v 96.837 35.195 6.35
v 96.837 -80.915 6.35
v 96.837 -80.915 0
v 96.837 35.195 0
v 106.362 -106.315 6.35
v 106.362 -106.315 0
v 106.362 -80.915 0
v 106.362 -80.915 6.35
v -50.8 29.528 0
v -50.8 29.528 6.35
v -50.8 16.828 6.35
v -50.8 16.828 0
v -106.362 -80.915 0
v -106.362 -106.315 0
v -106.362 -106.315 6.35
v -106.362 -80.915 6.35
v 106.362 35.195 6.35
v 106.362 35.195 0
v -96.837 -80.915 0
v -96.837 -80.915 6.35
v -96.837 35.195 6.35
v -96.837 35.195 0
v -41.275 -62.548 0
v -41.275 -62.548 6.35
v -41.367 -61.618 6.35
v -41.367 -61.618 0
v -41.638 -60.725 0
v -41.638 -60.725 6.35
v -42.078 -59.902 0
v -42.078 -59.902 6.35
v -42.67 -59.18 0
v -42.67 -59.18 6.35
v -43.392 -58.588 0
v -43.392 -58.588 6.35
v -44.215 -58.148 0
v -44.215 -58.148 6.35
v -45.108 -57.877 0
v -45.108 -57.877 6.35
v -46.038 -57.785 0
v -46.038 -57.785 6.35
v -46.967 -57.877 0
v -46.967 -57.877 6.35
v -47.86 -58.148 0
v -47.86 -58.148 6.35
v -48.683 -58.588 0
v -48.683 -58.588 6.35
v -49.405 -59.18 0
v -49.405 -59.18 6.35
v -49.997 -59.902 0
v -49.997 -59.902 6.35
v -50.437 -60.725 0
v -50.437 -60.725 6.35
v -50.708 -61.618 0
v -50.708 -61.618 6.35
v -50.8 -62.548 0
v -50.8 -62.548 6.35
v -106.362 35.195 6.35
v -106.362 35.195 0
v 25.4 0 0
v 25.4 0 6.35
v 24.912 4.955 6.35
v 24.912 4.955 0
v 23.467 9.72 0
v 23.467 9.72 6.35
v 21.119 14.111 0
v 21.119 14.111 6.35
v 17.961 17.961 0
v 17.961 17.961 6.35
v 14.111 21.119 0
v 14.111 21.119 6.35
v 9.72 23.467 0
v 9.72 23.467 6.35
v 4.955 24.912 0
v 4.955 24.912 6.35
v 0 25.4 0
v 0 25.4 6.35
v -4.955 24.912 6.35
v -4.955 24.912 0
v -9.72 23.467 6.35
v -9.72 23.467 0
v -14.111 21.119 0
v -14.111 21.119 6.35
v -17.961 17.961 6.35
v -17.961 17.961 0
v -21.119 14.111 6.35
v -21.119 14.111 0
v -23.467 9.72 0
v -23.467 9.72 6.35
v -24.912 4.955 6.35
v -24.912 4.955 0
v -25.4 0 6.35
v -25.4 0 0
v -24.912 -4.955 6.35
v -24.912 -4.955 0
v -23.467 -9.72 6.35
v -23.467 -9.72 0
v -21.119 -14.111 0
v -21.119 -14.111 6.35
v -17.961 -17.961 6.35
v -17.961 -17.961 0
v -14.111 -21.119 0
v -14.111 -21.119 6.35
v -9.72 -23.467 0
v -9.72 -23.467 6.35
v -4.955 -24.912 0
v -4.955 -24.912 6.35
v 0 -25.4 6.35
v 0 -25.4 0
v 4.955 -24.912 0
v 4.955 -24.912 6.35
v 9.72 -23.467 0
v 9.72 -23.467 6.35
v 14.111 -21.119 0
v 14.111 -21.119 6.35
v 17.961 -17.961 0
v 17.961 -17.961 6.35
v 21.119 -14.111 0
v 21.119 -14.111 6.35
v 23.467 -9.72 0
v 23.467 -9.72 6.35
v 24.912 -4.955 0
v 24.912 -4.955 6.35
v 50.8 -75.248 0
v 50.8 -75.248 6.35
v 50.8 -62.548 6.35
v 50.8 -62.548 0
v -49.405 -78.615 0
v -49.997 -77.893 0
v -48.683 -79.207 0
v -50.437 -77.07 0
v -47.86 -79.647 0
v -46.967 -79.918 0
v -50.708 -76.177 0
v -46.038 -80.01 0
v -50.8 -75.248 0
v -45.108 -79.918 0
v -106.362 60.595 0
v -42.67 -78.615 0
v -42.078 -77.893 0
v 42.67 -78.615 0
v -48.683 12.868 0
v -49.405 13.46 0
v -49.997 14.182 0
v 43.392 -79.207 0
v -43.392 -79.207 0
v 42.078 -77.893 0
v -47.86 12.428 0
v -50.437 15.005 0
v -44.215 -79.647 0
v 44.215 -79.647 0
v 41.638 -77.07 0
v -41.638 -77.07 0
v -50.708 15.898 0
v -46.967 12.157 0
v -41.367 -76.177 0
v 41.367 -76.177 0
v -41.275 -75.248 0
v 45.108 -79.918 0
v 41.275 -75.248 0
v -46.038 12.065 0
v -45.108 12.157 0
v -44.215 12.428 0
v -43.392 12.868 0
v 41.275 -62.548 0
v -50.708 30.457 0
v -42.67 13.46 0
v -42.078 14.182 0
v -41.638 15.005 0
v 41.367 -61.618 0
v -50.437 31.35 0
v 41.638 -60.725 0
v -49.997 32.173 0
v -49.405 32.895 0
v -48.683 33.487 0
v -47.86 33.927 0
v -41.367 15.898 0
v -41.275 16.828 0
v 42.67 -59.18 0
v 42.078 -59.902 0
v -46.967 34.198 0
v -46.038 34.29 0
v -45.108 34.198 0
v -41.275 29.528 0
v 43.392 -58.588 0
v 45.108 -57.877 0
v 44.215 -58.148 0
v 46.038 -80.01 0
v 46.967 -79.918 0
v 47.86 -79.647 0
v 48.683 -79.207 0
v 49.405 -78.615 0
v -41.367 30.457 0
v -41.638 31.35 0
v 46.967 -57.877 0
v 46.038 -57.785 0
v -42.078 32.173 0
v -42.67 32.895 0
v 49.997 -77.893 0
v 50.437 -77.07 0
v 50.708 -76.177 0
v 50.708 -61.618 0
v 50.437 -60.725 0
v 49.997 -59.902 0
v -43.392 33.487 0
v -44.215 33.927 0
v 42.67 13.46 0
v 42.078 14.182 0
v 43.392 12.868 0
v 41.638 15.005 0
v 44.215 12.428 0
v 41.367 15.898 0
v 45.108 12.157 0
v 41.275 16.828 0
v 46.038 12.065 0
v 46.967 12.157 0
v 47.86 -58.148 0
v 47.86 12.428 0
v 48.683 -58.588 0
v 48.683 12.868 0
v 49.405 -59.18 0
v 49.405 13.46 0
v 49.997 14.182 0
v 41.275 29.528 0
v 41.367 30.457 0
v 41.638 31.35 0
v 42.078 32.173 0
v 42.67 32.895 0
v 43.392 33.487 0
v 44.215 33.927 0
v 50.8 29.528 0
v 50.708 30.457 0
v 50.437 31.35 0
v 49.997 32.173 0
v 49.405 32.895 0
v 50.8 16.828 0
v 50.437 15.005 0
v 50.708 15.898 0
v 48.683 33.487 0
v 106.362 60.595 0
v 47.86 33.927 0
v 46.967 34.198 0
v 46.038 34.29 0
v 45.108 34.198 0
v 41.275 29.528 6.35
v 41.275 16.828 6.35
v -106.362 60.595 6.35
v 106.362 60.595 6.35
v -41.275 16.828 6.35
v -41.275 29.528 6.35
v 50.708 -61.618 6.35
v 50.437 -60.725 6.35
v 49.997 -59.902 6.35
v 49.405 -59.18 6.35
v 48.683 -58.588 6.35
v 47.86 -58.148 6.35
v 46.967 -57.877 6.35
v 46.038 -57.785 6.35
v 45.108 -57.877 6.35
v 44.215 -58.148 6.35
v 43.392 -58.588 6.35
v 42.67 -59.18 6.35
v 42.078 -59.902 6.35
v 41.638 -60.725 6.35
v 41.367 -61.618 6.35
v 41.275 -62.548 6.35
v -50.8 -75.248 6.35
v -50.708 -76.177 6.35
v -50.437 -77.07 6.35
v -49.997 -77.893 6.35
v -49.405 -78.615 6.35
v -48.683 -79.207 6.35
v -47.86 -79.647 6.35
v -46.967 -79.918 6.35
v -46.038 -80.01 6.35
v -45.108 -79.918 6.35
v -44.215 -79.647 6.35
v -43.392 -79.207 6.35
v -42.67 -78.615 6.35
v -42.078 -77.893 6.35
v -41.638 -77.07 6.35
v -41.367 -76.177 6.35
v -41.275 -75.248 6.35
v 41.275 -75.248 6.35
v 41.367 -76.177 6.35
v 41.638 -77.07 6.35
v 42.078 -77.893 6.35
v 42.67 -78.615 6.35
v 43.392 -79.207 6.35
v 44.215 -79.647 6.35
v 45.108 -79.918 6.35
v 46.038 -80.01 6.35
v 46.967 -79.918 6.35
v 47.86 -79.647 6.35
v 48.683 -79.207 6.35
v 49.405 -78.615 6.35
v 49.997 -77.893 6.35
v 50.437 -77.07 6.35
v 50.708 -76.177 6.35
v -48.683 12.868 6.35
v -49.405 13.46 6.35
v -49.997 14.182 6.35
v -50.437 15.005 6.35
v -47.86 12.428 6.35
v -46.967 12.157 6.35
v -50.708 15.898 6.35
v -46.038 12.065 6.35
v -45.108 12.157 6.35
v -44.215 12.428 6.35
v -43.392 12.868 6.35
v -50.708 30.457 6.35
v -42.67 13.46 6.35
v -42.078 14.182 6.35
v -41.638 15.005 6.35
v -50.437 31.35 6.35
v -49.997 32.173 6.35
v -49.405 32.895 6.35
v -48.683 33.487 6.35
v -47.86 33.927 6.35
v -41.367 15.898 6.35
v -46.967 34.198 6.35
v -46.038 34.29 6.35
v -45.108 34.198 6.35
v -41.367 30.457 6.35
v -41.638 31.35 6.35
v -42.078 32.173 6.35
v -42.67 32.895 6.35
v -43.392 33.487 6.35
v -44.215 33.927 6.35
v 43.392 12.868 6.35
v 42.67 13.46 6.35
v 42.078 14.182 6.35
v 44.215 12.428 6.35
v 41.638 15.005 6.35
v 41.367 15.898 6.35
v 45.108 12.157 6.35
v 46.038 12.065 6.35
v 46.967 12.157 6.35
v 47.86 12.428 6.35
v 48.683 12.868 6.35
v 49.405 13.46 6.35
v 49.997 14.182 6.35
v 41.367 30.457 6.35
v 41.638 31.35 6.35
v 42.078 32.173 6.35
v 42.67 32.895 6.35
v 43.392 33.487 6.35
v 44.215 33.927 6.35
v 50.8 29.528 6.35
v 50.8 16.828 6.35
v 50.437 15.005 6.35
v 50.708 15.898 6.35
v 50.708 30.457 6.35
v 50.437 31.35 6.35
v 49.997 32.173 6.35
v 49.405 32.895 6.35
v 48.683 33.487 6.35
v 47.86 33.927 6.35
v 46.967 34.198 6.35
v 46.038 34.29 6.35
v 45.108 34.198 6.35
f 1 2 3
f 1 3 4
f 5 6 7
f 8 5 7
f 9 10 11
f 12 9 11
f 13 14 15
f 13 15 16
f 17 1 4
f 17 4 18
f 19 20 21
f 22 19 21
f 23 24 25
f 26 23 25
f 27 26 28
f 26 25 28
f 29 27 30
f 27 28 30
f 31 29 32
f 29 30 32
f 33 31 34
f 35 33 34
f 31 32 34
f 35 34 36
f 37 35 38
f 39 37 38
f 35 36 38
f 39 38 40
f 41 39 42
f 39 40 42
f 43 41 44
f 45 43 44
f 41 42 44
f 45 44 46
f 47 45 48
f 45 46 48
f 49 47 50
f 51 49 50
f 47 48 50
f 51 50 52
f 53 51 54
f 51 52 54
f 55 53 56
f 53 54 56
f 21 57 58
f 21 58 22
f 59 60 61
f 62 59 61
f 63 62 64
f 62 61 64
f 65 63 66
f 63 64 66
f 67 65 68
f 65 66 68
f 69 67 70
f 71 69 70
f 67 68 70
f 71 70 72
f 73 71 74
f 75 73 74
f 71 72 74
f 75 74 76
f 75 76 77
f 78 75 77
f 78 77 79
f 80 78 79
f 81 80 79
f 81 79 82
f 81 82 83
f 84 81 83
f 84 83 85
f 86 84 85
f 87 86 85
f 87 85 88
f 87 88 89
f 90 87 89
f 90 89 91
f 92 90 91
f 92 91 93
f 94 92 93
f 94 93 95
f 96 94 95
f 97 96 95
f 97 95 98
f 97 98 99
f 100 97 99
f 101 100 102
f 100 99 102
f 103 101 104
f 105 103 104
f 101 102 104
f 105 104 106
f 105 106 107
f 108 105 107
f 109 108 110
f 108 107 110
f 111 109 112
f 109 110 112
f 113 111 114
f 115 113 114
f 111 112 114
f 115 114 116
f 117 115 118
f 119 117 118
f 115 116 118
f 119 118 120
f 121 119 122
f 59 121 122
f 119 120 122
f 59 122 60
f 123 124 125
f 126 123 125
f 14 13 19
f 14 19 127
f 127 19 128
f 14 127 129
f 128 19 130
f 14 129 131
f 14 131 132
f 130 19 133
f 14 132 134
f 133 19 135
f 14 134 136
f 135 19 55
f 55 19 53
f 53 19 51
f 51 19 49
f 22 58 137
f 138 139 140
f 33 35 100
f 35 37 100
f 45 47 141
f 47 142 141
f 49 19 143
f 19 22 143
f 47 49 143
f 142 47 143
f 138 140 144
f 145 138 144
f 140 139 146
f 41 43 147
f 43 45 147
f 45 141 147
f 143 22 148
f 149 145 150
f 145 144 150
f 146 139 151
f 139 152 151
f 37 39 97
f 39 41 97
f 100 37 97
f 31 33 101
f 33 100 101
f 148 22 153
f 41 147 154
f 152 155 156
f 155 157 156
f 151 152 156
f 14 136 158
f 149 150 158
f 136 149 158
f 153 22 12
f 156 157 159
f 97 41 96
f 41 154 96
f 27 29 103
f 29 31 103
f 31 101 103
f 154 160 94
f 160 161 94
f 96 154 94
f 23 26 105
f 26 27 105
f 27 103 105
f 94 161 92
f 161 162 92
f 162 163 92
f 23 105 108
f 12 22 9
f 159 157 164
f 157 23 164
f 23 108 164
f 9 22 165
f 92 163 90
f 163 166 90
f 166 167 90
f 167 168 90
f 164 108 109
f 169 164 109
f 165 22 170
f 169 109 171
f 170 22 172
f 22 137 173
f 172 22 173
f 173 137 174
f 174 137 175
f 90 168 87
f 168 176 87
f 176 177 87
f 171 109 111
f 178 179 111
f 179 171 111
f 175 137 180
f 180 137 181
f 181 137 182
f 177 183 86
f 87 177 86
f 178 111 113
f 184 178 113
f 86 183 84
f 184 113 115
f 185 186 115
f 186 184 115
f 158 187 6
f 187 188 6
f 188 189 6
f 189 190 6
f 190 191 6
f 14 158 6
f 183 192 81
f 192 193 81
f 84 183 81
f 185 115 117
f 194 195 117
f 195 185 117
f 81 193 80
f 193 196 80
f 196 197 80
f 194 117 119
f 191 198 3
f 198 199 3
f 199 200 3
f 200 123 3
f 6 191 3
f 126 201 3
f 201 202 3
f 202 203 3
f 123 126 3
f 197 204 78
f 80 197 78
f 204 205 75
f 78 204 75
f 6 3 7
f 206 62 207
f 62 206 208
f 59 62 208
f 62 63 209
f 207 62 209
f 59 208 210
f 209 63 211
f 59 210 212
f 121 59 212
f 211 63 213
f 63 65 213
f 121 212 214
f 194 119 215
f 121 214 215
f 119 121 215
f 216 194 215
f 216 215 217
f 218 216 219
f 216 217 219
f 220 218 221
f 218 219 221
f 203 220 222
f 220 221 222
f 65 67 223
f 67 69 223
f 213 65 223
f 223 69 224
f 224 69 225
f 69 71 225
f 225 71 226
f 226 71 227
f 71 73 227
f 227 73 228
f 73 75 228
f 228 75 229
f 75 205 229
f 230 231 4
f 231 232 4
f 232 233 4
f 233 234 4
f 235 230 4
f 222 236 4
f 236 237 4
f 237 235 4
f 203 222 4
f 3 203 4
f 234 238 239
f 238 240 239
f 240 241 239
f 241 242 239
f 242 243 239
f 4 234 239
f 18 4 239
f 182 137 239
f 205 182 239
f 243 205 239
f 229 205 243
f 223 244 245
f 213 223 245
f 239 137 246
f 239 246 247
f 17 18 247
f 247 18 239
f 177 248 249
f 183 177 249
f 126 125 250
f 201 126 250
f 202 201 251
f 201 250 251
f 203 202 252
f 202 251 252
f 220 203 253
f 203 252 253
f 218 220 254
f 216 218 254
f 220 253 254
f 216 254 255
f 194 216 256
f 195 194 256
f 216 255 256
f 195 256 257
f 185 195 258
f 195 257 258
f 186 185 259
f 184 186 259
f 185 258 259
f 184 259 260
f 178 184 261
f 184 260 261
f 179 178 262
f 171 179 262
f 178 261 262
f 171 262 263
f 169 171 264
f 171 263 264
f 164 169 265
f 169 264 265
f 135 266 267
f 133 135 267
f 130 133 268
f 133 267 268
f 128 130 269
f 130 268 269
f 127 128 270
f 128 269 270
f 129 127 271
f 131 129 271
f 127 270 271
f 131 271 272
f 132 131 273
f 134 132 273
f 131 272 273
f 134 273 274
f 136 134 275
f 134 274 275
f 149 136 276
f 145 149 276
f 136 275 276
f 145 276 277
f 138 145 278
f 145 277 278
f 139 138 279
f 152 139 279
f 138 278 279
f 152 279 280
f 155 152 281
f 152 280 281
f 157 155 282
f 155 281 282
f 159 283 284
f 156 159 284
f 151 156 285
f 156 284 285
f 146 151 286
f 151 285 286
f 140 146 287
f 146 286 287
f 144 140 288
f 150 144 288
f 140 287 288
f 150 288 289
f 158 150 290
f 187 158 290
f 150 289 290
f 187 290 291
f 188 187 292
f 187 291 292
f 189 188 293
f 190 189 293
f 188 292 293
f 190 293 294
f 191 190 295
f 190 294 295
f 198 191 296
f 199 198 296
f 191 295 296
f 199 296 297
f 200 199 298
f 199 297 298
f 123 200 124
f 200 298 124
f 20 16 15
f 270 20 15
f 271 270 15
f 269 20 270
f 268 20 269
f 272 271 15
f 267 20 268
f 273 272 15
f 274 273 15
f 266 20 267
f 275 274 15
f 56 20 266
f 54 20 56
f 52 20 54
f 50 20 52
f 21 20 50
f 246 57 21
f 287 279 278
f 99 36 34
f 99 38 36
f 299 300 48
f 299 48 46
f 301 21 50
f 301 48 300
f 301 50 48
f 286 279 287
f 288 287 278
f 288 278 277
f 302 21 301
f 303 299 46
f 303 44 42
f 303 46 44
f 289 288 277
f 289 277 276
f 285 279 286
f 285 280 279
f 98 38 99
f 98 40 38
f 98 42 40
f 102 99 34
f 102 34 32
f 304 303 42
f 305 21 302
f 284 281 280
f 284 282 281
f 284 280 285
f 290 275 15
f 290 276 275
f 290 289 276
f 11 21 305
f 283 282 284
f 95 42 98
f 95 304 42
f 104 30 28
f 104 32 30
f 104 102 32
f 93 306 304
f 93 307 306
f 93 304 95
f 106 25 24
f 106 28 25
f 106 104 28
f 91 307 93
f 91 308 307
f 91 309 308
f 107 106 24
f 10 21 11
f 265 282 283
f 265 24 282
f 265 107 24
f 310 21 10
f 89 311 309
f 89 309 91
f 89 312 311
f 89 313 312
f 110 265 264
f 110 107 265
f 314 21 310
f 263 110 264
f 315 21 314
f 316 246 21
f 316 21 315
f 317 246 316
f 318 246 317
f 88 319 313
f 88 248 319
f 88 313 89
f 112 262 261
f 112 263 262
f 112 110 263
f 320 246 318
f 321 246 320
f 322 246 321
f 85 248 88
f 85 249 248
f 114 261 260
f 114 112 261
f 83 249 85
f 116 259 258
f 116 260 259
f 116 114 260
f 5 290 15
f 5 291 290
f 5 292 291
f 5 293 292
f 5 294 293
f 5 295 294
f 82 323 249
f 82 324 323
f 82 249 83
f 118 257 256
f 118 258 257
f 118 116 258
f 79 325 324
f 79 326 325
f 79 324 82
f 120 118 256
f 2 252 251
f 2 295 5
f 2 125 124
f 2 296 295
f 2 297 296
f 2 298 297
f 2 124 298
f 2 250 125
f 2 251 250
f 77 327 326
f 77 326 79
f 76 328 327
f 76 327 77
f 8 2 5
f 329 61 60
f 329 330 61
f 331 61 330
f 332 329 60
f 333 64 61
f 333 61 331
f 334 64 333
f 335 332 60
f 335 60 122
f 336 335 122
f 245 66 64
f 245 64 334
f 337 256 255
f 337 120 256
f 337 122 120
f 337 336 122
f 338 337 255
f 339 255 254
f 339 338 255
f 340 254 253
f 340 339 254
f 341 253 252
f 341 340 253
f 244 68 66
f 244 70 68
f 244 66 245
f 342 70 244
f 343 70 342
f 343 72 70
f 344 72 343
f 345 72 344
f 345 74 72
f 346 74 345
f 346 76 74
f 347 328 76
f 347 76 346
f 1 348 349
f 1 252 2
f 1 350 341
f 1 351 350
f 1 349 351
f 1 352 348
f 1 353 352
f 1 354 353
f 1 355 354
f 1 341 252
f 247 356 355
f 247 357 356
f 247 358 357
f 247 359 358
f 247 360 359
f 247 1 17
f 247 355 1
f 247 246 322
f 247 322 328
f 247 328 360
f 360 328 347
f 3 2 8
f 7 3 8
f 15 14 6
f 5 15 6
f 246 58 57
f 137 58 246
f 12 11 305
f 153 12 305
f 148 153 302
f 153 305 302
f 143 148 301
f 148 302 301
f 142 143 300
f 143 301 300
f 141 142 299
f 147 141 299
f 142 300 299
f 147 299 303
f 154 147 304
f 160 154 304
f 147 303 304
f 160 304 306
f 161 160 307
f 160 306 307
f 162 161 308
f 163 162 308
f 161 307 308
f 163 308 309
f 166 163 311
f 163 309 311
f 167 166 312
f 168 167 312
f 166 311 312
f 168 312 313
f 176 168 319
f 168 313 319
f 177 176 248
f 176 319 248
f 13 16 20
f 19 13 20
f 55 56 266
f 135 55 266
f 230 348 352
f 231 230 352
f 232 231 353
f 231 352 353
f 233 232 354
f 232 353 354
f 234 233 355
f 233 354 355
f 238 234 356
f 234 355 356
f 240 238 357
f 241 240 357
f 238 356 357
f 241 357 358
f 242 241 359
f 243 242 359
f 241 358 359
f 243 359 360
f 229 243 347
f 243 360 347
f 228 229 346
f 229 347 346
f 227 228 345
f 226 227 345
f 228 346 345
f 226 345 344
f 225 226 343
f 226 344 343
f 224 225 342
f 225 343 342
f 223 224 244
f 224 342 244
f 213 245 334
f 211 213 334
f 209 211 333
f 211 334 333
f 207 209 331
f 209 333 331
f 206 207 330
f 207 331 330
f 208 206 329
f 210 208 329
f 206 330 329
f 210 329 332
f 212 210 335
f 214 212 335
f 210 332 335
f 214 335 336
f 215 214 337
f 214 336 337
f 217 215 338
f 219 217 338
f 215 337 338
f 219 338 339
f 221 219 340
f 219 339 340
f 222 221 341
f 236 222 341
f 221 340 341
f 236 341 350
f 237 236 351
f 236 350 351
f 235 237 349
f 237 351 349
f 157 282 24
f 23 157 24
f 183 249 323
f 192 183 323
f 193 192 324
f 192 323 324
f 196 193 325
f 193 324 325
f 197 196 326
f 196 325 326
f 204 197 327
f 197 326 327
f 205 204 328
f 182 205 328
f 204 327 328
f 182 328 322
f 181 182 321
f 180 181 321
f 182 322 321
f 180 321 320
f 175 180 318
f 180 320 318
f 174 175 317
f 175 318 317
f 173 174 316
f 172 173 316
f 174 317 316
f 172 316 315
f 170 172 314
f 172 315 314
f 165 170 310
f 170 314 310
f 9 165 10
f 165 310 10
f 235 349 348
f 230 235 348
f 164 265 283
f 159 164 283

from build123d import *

# Parameters (mm, degrees)
SKETCH2_W          = 212.725
SKETCH2_H          = 166.909166922
EXTRUDE1_DEPTH     = 6.35
CUT_EXTRUDE1_REACH = 152.519
SKETCH3_R          = 25.4
CUT_EXTRUDE2_REACH = 152.519
SKETCH4_W          = 9.525
SKETCH4_H          = 116.109166922


with BuildPart() as part:
    # Sketch2 → Extrude1 (new body)
    with BuildSketch(Plane.XY):
        with Locations((0, -22.86)):
            Rectangle(SKETCH2_W, SKETCH2_H)
    extrude(amount=EXTRUDE1_DEPTH)

    # Sketch3 → Cut-Extrude1 (cut, up to next)
    with BuildSketch(Plane.XY.offset(6.35), mode=Mode.PRIVATE) as cut_extrude1_sk1:
        Circle(SKETCH3_R)
    cut_extrude1_tool1 = extrude(cut_extrude1_sk1.sketch, amount=-CUT_EXTRUDE1_REACH, mode=Mode.PRIVATE) & part.part
    # Sketch3 → Cut-Extrude1 (cut, up to next)
    with BuildSketch(Plane.XY.offset(6.35), mode=Mode.PRIVATE) as cut_extrude1_sk2:
        with BuildLine():
            Line((50.8, -75.2475), (50.8, -62.5475))
            ThreePointArc((50.8, -62.5475), (46.0375, -57.785), (41.275, -62.5475))
            Line((41.275, -62.5475), (41.275, -75.2475))
            ThreePointArc((41.275, -75.2475), (46.0375, -80.01), (50.8, -75.2475))
        make_face()
    cut_extrude1_tool2 = extrude(cut_extrude1_sk2.sketch, amount=-CUT_EXTRUDE1_REACH, mode=Mode.PRIVATE) & part.part
    # Sketch3 → Cut-Extrude1 (cut, up to next)
    with BuildSketch(Plane.XY.offset(6.35), mode=Mode.PRIVATE) as cut_extrude1_sk3:
        with BuildLine():
            Line((50.8, 16.8275), (50.8, 29.5275))
            ThreePointArc((50.8, 29.5275), (46.0375, 34.29), (41.275, 29.5275))
            Line((41.275, 29.5275), (41.275, 16.8275))
            ThreePointArc((41.275, 16.8275), (46.0375, 12.065), (50.8, 16.8275))
        make_face()
    cut_extrude1_tool3 = extrude(cut_extrude1_sk3.sketch, amount=-CUT_EXTRUDE1_REACH, mode=Mode.PRIVATE) & part.part
    # Sketch3 → Cut-Extrude1 (cut, up to next)
    with BuildSketch(Plane.XY.offset(6.35), mode=Mode.PRIVATE) as cut_extrude1_sk4:
        with BuildLine():
            Line((-41.275, 16.8275), (-41.275, 29.5275))
            ThreePointArc((-41.275, 29.5275), (-46.0375, 34.29), (-50.8, 29.5275))
            Line((-50.8, 29.5275), (-50.8, 16.8275))
            ThreePointArc((-50.8, 16.8275), (-46.0375, 12.065), (-41.275, 16.8275))
        make_face()
    cut_extrude1_tool4 = extrude(cut_extrude1_sk4.sketch, amount=-CUT_EXTRUDE1_REACH, mode=Mode.PRIVATE) & part.part
    # Sketch3 → Cut-Extrude1 (cut, up to next)
    with BuildSketch(Plane.XY.offset(6.35), mode=Mode.PRIVATE) as cut_extrude1_sk5:
        with BuildLine():
            Line((-41.275, -75.2475), (-41.275, -62.5475))
            ThreePointArc((-41.275, -62.5475), (-46.0375, -57.785), (-50.8, -62.5475))
            Line((-50.8, -62.5475), (-50.8, -75.2475))
            ThreePointArc((-50.8, -75.2475), (-46.0375, -80.01), (-41.275, -75.2475))
        make_face()
    cut_extrude1_tool5 = extrude(cut_extrude1_sk5.sketch, amount=-CUT_EXTRUDE1_REACH, mode=Mode.PRIVATE) & part.part
    add(cut_extrude1_tool1.solids().sort_by_distance((0, 0, 6.35))[0], mode=Mode.SUBTRACT)
    add(cut_extrude1_tool2.solids().sort_by_distance((46.0375, -68.8975, 6.35))[0], mode=Mode.SUBTRACT)
    add(cut_extrude1_tool3.solids().sort_by_distance((46.0375, 23.1775, 6.35))[0], mode=Mode.SUBTRACT)
    add(cut_extrude1_tool4.solids().sort_by_distance((-46.0375, 23.1775, 6.35))[0], mode=Mode.SUBTRACT)
    add(cut_extrude1_tool5.solids().sort_by_distance((-46.0375, -68.8975, 6.35))[0], mode=Mode.SUBTRACT)

    # Sketch4 → Cut-Extrude2 (cut, up to next)
    with BuildSketch(Plane.XY.offset(6.35), mode=Mode.PRIVATE) as cut_extrude2_sk1:
        with Locations((-101.6, -22.86)):
            Rectangle(SKETCH4_W, SKETCH4_H)
    cut_extrude2_tool1 = extrude(cut_extrude2_sk1.sketch, amount=-CUT_EXTRUDE2_REACH, mode=Mode.PRIVATE) & part.part
    # Sketch4 → Cut-Extrude2 (cut, up to next)
    with BuildSketch(Plane.XY.offset(6.35), mode=Mode.PRIVATE) as cut_extrude2_sk2:
        with Locations((101.6, -22.86)):
            Rectangle(SKETCH4_W, SKETCH4_H)
    cut_extrude2_tool2 = extrude(cut_extrude2_sk2.sketch, amount=-CUT_EXTRUDE2_REACH, mode=Mode.PRIVATE) & part.part
    add(cut_extrude2_tool1.solids().sort_by_distance((-101.6, -22.86, 6.35))[0], mode=Mode.SUBTRACT)
    add(cut_extrude2_tool2.solids().sort_by_distance((101.6, -22.86, 6.35))[0], mode=Mode.SUBTRACT)


solid = part.part
